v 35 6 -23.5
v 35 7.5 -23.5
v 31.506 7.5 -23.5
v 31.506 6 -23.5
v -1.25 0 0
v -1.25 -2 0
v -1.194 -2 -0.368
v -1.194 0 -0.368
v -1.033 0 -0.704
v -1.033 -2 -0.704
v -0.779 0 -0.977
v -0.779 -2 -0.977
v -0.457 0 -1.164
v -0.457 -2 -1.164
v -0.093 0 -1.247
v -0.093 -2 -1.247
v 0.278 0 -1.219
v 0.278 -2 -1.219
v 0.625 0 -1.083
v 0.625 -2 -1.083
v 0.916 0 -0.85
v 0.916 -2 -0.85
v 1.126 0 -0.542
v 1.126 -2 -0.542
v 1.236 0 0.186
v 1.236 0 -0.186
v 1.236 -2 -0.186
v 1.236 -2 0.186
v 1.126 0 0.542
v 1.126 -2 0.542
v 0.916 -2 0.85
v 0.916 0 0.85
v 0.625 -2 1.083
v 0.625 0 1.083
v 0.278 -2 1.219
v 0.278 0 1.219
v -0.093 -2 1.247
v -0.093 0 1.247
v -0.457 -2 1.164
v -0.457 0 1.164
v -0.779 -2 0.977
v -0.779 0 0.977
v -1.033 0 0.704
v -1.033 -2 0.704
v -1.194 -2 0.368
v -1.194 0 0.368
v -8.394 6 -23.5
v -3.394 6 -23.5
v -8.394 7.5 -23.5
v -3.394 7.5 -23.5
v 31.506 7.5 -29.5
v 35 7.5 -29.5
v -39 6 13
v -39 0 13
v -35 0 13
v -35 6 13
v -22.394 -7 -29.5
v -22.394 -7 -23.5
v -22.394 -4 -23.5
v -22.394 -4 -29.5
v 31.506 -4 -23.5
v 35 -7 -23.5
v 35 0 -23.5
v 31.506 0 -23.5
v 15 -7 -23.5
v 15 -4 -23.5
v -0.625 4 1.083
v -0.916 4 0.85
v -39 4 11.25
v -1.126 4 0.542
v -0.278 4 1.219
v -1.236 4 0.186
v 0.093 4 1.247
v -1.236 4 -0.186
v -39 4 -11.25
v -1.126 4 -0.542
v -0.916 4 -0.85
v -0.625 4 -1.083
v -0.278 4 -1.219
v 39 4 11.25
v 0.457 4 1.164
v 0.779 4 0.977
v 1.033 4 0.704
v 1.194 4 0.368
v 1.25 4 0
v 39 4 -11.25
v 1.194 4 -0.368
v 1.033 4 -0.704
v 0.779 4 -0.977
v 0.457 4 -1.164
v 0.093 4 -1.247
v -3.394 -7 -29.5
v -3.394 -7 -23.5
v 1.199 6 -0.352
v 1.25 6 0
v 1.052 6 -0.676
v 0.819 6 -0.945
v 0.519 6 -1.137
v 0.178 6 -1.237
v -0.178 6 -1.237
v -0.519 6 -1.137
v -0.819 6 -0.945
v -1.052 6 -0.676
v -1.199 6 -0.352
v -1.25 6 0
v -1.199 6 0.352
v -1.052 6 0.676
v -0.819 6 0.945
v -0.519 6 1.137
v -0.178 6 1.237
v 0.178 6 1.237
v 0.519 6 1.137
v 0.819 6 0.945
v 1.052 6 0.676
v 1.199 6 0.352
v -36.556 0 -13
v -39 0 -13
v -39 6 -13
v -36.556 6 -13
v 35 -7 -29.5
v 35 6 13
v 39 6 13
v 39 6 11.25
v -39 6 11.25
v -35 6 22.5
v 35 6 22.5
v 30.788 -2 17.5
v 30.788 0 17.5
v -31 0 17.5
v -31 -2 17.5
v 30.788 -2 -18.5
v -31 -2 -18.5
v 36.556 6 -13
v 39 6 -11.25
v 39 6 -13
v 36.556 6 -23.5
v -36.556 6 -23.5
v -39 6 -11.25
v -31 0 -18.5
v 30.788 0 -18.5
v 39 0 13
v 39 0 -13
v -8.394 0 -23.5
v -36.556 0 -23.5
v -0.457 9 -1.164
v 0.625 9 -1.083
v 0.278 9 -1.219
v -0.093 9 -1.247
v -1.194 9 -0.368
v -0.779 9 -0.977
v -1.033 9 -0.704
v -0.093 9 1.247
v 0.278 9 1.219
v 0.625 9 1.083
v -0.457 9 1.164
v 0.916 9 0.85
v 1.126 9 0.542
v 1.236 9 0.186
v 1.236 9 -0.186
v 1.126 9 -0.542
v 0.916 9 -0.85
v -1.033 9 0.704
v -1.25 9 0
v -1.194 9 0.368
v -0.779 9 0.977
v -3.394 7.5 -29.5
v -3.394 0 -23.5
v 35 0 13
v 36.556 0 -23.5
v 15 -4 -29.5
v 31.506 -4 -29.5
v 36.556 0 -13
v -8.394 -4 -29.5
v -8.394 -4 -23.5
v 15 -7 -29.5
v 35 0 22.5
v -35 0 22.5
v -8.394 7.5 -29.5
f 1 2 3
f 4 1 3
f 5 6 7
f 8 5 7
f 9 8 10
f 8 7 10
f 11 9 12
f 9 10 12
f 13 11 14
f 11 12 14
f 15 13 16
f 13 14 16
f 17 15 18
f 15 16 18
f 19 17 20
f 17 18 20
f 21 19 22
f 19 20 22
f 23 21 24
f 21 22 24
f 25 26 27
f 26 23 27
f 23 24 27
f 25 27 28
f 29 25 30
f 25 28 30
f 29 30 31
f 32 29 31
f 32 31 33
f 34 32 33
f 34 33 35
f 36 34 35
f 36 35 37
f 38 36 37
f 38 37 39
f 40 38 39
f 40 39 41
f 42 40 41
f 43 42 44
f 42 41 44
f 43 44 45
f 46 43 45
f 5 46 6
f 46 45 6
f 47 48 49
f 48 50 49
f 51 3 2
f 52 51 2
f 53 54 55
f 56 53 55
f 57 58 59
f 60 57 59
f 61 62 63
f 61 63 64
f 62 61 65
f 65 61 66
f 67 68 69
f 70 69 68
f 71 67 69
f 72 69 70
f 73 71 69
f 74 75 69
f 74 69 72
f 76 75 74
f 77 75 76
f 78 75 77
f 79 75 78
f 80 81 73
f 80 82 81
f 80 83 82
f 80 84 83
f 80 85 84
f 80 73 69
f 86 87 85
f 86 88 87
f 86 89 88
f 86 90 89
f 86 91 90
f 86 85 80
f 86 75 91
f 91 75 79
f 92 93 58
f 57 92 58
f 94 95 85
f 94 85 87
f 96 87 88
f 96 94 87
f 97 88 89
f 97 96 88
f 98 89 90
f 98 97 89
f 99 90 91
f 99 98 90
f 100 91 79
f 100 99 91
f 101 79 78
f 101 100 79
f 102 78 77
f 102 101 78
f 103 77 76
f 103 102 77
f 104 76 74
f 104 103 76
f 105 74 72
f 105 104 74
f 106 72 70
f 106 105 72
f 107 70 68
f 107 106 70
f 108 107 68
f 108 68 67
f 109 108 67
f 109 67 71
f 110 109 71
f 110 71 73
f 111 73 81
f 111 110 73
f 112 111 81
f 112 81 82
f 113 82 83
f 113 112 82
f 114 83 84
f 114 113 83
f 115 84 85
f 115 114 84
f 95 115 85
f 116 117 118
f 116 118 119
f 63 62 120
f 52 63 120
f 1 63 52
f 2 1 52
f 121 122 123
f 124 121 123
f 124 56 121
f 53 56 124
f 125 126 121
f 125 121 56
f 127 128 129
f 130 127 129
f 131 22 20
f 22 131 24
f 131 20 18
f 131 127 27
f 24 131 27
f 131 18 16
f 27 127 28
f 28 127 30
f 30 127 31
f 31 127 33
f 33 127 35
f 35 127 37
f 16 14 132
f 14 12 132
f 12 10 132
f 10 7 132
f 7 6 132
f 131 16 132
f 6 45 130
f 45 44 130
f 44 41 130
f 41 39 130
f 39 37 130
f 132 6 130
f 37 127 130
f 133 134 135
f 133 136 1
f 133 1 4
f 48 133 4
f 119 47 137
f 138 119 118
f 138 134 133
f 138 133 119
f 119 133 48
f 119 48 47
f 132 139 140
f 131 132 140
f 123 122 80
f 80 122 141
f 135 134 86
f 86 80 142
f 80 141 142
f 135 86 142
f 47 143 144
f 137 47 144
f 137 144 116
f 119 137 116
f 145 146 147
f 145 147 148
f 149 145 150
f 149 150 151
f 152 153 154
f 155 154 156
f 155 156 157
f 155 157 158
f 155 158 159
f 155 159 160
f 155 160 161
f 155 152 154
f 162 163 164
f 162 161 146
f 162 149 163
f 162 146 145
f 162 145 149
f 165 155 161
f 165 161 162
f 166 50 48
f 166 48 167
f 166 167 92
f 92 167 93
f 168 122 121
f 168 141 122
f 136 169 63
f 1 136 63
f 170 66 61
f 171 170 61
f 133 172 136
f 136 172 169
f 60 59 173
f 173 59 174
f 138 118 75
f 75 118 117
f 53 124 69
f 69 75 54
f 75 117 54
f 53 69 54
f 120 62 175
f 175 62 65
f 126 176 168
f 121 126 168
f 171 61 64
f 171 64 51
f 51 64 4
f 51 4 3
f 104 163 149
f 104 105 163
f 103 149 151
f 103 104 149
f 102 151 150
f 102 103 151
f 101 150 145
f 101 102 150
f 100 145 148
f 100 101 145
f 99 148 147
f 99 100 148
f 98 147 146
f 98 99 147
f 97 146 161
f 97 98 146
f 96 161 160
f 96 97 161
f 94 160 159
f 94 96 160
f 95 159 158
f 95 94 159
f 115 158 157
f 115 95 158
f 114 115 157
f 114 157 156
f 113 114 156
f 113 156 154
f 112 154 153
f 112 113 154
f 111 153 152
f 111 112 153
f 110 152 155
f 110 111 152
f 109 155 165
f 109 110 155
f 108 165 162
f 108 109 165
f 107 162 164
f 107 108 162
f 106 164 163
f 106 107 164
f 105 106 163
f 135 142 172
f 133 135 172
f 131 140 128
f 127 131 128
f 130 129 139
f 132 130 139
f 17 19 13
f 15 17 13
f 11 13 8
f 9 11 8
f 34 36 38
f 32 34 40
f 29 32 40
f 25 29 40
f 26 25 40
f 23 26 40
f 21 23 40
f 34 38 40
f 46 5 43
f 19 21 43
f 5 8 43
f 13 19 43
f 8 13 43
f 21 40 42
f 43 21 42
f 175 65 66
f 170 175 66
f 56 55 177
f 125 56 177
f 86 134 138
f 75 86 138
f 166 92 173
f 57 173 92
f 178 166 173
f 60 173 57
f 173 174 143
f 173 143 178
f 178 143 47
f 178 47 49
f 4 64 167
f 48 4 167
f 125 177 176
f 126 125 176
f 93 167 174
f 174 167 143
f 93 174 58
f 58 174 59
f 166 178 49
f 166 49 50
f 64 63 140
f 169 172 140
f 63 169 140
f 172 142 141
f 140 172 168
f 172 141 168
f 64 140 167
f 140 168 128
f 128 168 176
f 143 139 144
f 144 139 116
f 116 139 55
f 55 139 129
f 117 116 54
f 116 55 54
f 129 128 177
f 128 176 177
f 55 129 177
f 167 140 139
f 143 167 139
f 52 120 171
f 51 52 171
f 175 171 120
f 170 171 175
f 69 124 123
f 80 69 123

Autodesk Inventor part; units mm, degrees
ref_plane "YZ Plane" through (0, 0, 0) normal (1, 0, 0) x (0, 1, 0)
ref_plane "XZ Plane" through (0, 0, 0) normal (0, 1, 0) x (-1, 0, 0)
ref_plane "XY Plane" through (0, 0, 0) normal (0, 0, 1) x (1, 0, 0)
sketch "Sketch1" plane through (0, 0, 0) normal (0, 1, 0) x (-1, 0, 0)
  line L0 (-36.5556, -23.5) -> (36.5556, -23.5)
  line L1 (35, 22.5) -> (-35, 22.5)
  line L2 (-36.5556, -23.5) -> (35, 22.5) construction
  line L3 (36.5556, -23.5) -> (-35, 22.5) construction
  line L4 (-39, 0) -> (-39, -11)
  line L5 (-39, -11) -> (-39, 11)
  line L6 (39, -11) -> (39, 11)
  line L7 (-39, -11) -> (-39, -13)
  line L8 (-39, -13) -> (-36.5556, -13)
  line L9 (-39, 11) -> (-39, 13)
  line L10 (-39, 13) -> (-35, 13)
  line L11 (39, -11) -> (39, -13)
  line L12 (39, -13) -> (36.5556, -13)
  line L13 (39, 11) -> (39, 13)
  line L14 (39, 13) -> (35, 13)
  line L15 (-30.788, 17.5) -> (31, 17.5)
  line L16 (31, 17.5) -> (31, -18.5)
  line L17 (31, -18.5) -> (-30.788, -18.5)
  line L18 (-30.788, -18.5) -> (-30.788, 17.5)
  line L19 (-30.788, 17.5) -> (31, -18.5) construction
  line L20 (31, 17.5) -> (-30.788, -18.5) construction
  line L21 (36.5556, -23.5) -> (36.5556, -13)
  line L22 (35, 13) -> (35, 22.5)
  line L23 (-35, 22.5) -> (-35, 13)
  line L24 (-36.5556, -13) -> (-36.5556, -23.5)
  circle A0 centre (0, 0) radius 1.25
  dimension "d133" = 2.5
  dimension "d169" = 36
  dimension "d170" = 4
  dimension "d171" = 5
  dimension "d180" = 46
extrude "Extrusion39" add sketch "Sketch1" along normal blind 6 contours L24 L8 L7 L4 L5 L9 L10 L23 L1 L22 L14 L13 L6 L11 L12 L21 L0
extrude "Extrusion40" add sketch "Sketch1" against normal blind 2 contours L15 L16 L17 L18
extrude "Extrusion41" add sketch "Sketch1" along normal blind 6 contours L15 L16 L17 L18
extrude "Extrusion42" add sketch "Sketch1" along normal blind 9 contours A0
sketch "Sketch30" plane through (0, 6, 0) normal (0, 1, 0) x (1, 0, 0)
  line L0 (-39, -11.25) -> (39, -11.25)
  line L1 (39, -11.25) -> (39, 11.25)
  line L2 (39, 11.25) -> (-39, 11.25)
  line L3 (-39, 11.25) -> (-39, -11.25)
  circle A0 centre (0, 0) radius 1.25 projected
  line L4 (-39, -11.25) -> (39, 11.25) construction
  line L5 (39, -11.25) -> (-39, 11.25) construction
  dimension "d142" = 78
  dimension "d143" = 22.5
extrude "Extrusion43" cut sketch "Sketch30" against normal blind 2
sketch "Sketch31" plane through (36.5556, 0, -23.5) normal (0, 0, -1) x (-1, 0, 0)
  line L0 (67.5556, 0) -> (5.7676, 0) projected
  line L1 (67.5556, 0) -> (67.5556, -2) projected
  line L2 (64.95, 0) -> (44.95, 0)
  line L3 (44.95, 0) -> (44.95, 7.5)
  line L4 (39.95, 7.5) -> (39.95, -7)
  line L5 (39.95, -7) -> (58.95, -7)
  line L6 (58.95, -7) -> (58.95, -4)
  line L7 (58.95, -4) -> (44.95, -4)
  line L8 (44.95, -4) -> (44.95, 0)
  line L9 (75.5556, 4) -> (-2.4444, 4) projected
  line L10 (5.05, 0) -> (5.05, 4)
  line L11 (1.5556, 0) -> (1.5556, 6) projected
  line L12 (71.5556, 0) -> (1.5556, 0) projected
  line L13 (1.5556, 0) -> (1.5556, -7)
  line L14 (1.5556, -7) -> (21.5556, -7)
  line L15 (21.5556, -7) -> (21.5556, -4)
  line L16 (21.5556, -4) -> (5.05, -4)
  line L17 (5.7676, 0) -> (5.7676, -2) projected
  line L18 (5.05, -4) -> (5.05, 0)
  line L19 (44.95, 7.5) -> (39.95, 7.5)
  line L20 (5.05, 4) -> (5.05, 7.5)
  line L21 (5.05, 7.5) -> (1.5556, 7.5)
  line L22 (1.5556, 7.5) -> (1.5556, -7)
  point P0 (36.5556, 0)
  point P1 (-2.4444, 4)
  point P2 (66, 0)
  point P3 (4.212, 0)
  dimension "d152" = 5
  dimension "d157" = 20
  dimension "d163" = 4
  dimension "d164" = 4
  dimension "d187" = 3
  dimension "d188" = 3
extrude "Extrusion51" cut sketch "Sketch31" along normal blind 10 contours L18 L16 L15 L14 L13 L12
extrude "Extrusion52" cut sketch "Sketch31" along normal blind 10 contours L12 L11 L9 L10 | L9 L11 L22 L21 L20
extrude "Extrusion54" add sketch "Sketch31" along normal blind 6 contours L12 L11 L9 L10 | L18 L16 L15 L14 L13 L12 | L9 L11 L22 L21 L20
extrude "Extrusion55" add sketch "Sketch31" along normal blind 6 contours L8 L7 L6 L5 L4 L0 | L0 L4 L9 L3 | L9 L4 L19 L3
equation "\"d187\" = d188"
properties part number "kotelon yläosa"
